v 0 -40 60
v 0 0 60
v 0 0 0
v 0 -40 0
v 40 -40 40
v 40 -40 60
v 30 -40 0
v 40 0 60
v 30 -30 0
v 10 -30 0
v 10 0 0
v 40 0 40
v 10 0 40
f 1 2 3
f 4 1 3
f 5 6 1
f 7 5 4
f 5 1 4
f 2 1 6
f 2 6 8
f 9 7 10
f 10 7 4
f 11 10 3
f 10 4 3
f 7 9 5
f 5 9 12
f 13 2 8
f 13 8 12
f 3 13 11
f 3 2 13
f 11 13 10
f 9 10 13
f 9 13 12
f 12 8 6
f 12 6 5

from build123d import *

# Parameters (mm, degrees)
SKETCH_2_W          = 60
SKETCH_2_H          = 40
EXTRUDE_1_DEPTH     = 40
CUT_EXTRUDE_1_DEPTH = 40
EXTRUDE_2_REACH     = 84.462
SKETCH_7_W          = 10
SKETCH_7_H          = 40


with BuildPart() as part:
    # 草圖2 → 填料-伸長1 (new body)
    with BuildSketch(Plane(origin=(0, 0, 0), x_dir=(0, 0, -1), z_dir=(1, 0, 0))):
        with Locations((-30, -20)):
            Rectangle(SKETCH_2_W, SKETCH_2_H)
    extrude(amount=EXTRUDE_1_DEPTH)

    # 草圖3 → 除料-伸長1 (cut)
    with BuildSketch(Plane(origin=(0, 0, 0), x_dir=(1, 0, 0), z_dir=(0, 1, 0))):
        Polygon((30, 0), (40, -40), (40, 0), align=None)
    extrude(amount=-CUT_EXTRUDE_1_DEPTH, mode=Mode.SUBTRACT)

    # 除料-掃出1: sweep along a path in 草圖6
    with BuildLine(Plane(origin=(28.235294118, 0, -7.058823529), x_dir=(-0.24253562503633305, 0, -0.9701425001453319), z_dir=(0.9701425001453319, 0, -0.24253562503633305))) as sweep_1_path:
        Line((-48.507125007, 0), (-7.276068751, -30))
    # 草圖5 → 除料-掃出1 (sweep, cut)
    with BuildSketch(Plane(origin=(0, 0, 0), x_dir=(1, 0, 0), z_dir=(0, 1, 0))):
        Polygon((30, 0), (10, 0), (10, -40), (40, -40), align=None)
    sweep(path=sweep_1_path.line, mode=Mode.SUBTRACT)

    # 填料-伸長2: up to this face of the body (flat: up to its plane)
    extrude_2_end = Plane(part.part.faces().sort_by_distance((20, -15, 20))[0])
    # 草圖7 → 填料-伸長2 (add, up to the picked face)
    with BuildSketch(Plane(origin=(0, 0, 0), x_dir=(1, 0, 0), z_dir=(0, 1, 0)), mode=Mode.PRIVATE) as extrude_2_sk1:
        with Locations((5, -20)):
            Rectangle(SKETCH_7_W, SKETCH_7_H)
    extrude_2_tool1 = split(extrude(extrude_2_sk1.sketch, amount=-EXTRUDE_2_REACH, mode=Mode.PRIVATE), bisect_by=extrude_2_end, keep=Keep.BOTH, mode=Mode.PRIVATE)
    add(extrude_2_tool1.solids().sort_by(Axis((5, 0, 20), (0, -1, 0)))[0])


solid = part.part
